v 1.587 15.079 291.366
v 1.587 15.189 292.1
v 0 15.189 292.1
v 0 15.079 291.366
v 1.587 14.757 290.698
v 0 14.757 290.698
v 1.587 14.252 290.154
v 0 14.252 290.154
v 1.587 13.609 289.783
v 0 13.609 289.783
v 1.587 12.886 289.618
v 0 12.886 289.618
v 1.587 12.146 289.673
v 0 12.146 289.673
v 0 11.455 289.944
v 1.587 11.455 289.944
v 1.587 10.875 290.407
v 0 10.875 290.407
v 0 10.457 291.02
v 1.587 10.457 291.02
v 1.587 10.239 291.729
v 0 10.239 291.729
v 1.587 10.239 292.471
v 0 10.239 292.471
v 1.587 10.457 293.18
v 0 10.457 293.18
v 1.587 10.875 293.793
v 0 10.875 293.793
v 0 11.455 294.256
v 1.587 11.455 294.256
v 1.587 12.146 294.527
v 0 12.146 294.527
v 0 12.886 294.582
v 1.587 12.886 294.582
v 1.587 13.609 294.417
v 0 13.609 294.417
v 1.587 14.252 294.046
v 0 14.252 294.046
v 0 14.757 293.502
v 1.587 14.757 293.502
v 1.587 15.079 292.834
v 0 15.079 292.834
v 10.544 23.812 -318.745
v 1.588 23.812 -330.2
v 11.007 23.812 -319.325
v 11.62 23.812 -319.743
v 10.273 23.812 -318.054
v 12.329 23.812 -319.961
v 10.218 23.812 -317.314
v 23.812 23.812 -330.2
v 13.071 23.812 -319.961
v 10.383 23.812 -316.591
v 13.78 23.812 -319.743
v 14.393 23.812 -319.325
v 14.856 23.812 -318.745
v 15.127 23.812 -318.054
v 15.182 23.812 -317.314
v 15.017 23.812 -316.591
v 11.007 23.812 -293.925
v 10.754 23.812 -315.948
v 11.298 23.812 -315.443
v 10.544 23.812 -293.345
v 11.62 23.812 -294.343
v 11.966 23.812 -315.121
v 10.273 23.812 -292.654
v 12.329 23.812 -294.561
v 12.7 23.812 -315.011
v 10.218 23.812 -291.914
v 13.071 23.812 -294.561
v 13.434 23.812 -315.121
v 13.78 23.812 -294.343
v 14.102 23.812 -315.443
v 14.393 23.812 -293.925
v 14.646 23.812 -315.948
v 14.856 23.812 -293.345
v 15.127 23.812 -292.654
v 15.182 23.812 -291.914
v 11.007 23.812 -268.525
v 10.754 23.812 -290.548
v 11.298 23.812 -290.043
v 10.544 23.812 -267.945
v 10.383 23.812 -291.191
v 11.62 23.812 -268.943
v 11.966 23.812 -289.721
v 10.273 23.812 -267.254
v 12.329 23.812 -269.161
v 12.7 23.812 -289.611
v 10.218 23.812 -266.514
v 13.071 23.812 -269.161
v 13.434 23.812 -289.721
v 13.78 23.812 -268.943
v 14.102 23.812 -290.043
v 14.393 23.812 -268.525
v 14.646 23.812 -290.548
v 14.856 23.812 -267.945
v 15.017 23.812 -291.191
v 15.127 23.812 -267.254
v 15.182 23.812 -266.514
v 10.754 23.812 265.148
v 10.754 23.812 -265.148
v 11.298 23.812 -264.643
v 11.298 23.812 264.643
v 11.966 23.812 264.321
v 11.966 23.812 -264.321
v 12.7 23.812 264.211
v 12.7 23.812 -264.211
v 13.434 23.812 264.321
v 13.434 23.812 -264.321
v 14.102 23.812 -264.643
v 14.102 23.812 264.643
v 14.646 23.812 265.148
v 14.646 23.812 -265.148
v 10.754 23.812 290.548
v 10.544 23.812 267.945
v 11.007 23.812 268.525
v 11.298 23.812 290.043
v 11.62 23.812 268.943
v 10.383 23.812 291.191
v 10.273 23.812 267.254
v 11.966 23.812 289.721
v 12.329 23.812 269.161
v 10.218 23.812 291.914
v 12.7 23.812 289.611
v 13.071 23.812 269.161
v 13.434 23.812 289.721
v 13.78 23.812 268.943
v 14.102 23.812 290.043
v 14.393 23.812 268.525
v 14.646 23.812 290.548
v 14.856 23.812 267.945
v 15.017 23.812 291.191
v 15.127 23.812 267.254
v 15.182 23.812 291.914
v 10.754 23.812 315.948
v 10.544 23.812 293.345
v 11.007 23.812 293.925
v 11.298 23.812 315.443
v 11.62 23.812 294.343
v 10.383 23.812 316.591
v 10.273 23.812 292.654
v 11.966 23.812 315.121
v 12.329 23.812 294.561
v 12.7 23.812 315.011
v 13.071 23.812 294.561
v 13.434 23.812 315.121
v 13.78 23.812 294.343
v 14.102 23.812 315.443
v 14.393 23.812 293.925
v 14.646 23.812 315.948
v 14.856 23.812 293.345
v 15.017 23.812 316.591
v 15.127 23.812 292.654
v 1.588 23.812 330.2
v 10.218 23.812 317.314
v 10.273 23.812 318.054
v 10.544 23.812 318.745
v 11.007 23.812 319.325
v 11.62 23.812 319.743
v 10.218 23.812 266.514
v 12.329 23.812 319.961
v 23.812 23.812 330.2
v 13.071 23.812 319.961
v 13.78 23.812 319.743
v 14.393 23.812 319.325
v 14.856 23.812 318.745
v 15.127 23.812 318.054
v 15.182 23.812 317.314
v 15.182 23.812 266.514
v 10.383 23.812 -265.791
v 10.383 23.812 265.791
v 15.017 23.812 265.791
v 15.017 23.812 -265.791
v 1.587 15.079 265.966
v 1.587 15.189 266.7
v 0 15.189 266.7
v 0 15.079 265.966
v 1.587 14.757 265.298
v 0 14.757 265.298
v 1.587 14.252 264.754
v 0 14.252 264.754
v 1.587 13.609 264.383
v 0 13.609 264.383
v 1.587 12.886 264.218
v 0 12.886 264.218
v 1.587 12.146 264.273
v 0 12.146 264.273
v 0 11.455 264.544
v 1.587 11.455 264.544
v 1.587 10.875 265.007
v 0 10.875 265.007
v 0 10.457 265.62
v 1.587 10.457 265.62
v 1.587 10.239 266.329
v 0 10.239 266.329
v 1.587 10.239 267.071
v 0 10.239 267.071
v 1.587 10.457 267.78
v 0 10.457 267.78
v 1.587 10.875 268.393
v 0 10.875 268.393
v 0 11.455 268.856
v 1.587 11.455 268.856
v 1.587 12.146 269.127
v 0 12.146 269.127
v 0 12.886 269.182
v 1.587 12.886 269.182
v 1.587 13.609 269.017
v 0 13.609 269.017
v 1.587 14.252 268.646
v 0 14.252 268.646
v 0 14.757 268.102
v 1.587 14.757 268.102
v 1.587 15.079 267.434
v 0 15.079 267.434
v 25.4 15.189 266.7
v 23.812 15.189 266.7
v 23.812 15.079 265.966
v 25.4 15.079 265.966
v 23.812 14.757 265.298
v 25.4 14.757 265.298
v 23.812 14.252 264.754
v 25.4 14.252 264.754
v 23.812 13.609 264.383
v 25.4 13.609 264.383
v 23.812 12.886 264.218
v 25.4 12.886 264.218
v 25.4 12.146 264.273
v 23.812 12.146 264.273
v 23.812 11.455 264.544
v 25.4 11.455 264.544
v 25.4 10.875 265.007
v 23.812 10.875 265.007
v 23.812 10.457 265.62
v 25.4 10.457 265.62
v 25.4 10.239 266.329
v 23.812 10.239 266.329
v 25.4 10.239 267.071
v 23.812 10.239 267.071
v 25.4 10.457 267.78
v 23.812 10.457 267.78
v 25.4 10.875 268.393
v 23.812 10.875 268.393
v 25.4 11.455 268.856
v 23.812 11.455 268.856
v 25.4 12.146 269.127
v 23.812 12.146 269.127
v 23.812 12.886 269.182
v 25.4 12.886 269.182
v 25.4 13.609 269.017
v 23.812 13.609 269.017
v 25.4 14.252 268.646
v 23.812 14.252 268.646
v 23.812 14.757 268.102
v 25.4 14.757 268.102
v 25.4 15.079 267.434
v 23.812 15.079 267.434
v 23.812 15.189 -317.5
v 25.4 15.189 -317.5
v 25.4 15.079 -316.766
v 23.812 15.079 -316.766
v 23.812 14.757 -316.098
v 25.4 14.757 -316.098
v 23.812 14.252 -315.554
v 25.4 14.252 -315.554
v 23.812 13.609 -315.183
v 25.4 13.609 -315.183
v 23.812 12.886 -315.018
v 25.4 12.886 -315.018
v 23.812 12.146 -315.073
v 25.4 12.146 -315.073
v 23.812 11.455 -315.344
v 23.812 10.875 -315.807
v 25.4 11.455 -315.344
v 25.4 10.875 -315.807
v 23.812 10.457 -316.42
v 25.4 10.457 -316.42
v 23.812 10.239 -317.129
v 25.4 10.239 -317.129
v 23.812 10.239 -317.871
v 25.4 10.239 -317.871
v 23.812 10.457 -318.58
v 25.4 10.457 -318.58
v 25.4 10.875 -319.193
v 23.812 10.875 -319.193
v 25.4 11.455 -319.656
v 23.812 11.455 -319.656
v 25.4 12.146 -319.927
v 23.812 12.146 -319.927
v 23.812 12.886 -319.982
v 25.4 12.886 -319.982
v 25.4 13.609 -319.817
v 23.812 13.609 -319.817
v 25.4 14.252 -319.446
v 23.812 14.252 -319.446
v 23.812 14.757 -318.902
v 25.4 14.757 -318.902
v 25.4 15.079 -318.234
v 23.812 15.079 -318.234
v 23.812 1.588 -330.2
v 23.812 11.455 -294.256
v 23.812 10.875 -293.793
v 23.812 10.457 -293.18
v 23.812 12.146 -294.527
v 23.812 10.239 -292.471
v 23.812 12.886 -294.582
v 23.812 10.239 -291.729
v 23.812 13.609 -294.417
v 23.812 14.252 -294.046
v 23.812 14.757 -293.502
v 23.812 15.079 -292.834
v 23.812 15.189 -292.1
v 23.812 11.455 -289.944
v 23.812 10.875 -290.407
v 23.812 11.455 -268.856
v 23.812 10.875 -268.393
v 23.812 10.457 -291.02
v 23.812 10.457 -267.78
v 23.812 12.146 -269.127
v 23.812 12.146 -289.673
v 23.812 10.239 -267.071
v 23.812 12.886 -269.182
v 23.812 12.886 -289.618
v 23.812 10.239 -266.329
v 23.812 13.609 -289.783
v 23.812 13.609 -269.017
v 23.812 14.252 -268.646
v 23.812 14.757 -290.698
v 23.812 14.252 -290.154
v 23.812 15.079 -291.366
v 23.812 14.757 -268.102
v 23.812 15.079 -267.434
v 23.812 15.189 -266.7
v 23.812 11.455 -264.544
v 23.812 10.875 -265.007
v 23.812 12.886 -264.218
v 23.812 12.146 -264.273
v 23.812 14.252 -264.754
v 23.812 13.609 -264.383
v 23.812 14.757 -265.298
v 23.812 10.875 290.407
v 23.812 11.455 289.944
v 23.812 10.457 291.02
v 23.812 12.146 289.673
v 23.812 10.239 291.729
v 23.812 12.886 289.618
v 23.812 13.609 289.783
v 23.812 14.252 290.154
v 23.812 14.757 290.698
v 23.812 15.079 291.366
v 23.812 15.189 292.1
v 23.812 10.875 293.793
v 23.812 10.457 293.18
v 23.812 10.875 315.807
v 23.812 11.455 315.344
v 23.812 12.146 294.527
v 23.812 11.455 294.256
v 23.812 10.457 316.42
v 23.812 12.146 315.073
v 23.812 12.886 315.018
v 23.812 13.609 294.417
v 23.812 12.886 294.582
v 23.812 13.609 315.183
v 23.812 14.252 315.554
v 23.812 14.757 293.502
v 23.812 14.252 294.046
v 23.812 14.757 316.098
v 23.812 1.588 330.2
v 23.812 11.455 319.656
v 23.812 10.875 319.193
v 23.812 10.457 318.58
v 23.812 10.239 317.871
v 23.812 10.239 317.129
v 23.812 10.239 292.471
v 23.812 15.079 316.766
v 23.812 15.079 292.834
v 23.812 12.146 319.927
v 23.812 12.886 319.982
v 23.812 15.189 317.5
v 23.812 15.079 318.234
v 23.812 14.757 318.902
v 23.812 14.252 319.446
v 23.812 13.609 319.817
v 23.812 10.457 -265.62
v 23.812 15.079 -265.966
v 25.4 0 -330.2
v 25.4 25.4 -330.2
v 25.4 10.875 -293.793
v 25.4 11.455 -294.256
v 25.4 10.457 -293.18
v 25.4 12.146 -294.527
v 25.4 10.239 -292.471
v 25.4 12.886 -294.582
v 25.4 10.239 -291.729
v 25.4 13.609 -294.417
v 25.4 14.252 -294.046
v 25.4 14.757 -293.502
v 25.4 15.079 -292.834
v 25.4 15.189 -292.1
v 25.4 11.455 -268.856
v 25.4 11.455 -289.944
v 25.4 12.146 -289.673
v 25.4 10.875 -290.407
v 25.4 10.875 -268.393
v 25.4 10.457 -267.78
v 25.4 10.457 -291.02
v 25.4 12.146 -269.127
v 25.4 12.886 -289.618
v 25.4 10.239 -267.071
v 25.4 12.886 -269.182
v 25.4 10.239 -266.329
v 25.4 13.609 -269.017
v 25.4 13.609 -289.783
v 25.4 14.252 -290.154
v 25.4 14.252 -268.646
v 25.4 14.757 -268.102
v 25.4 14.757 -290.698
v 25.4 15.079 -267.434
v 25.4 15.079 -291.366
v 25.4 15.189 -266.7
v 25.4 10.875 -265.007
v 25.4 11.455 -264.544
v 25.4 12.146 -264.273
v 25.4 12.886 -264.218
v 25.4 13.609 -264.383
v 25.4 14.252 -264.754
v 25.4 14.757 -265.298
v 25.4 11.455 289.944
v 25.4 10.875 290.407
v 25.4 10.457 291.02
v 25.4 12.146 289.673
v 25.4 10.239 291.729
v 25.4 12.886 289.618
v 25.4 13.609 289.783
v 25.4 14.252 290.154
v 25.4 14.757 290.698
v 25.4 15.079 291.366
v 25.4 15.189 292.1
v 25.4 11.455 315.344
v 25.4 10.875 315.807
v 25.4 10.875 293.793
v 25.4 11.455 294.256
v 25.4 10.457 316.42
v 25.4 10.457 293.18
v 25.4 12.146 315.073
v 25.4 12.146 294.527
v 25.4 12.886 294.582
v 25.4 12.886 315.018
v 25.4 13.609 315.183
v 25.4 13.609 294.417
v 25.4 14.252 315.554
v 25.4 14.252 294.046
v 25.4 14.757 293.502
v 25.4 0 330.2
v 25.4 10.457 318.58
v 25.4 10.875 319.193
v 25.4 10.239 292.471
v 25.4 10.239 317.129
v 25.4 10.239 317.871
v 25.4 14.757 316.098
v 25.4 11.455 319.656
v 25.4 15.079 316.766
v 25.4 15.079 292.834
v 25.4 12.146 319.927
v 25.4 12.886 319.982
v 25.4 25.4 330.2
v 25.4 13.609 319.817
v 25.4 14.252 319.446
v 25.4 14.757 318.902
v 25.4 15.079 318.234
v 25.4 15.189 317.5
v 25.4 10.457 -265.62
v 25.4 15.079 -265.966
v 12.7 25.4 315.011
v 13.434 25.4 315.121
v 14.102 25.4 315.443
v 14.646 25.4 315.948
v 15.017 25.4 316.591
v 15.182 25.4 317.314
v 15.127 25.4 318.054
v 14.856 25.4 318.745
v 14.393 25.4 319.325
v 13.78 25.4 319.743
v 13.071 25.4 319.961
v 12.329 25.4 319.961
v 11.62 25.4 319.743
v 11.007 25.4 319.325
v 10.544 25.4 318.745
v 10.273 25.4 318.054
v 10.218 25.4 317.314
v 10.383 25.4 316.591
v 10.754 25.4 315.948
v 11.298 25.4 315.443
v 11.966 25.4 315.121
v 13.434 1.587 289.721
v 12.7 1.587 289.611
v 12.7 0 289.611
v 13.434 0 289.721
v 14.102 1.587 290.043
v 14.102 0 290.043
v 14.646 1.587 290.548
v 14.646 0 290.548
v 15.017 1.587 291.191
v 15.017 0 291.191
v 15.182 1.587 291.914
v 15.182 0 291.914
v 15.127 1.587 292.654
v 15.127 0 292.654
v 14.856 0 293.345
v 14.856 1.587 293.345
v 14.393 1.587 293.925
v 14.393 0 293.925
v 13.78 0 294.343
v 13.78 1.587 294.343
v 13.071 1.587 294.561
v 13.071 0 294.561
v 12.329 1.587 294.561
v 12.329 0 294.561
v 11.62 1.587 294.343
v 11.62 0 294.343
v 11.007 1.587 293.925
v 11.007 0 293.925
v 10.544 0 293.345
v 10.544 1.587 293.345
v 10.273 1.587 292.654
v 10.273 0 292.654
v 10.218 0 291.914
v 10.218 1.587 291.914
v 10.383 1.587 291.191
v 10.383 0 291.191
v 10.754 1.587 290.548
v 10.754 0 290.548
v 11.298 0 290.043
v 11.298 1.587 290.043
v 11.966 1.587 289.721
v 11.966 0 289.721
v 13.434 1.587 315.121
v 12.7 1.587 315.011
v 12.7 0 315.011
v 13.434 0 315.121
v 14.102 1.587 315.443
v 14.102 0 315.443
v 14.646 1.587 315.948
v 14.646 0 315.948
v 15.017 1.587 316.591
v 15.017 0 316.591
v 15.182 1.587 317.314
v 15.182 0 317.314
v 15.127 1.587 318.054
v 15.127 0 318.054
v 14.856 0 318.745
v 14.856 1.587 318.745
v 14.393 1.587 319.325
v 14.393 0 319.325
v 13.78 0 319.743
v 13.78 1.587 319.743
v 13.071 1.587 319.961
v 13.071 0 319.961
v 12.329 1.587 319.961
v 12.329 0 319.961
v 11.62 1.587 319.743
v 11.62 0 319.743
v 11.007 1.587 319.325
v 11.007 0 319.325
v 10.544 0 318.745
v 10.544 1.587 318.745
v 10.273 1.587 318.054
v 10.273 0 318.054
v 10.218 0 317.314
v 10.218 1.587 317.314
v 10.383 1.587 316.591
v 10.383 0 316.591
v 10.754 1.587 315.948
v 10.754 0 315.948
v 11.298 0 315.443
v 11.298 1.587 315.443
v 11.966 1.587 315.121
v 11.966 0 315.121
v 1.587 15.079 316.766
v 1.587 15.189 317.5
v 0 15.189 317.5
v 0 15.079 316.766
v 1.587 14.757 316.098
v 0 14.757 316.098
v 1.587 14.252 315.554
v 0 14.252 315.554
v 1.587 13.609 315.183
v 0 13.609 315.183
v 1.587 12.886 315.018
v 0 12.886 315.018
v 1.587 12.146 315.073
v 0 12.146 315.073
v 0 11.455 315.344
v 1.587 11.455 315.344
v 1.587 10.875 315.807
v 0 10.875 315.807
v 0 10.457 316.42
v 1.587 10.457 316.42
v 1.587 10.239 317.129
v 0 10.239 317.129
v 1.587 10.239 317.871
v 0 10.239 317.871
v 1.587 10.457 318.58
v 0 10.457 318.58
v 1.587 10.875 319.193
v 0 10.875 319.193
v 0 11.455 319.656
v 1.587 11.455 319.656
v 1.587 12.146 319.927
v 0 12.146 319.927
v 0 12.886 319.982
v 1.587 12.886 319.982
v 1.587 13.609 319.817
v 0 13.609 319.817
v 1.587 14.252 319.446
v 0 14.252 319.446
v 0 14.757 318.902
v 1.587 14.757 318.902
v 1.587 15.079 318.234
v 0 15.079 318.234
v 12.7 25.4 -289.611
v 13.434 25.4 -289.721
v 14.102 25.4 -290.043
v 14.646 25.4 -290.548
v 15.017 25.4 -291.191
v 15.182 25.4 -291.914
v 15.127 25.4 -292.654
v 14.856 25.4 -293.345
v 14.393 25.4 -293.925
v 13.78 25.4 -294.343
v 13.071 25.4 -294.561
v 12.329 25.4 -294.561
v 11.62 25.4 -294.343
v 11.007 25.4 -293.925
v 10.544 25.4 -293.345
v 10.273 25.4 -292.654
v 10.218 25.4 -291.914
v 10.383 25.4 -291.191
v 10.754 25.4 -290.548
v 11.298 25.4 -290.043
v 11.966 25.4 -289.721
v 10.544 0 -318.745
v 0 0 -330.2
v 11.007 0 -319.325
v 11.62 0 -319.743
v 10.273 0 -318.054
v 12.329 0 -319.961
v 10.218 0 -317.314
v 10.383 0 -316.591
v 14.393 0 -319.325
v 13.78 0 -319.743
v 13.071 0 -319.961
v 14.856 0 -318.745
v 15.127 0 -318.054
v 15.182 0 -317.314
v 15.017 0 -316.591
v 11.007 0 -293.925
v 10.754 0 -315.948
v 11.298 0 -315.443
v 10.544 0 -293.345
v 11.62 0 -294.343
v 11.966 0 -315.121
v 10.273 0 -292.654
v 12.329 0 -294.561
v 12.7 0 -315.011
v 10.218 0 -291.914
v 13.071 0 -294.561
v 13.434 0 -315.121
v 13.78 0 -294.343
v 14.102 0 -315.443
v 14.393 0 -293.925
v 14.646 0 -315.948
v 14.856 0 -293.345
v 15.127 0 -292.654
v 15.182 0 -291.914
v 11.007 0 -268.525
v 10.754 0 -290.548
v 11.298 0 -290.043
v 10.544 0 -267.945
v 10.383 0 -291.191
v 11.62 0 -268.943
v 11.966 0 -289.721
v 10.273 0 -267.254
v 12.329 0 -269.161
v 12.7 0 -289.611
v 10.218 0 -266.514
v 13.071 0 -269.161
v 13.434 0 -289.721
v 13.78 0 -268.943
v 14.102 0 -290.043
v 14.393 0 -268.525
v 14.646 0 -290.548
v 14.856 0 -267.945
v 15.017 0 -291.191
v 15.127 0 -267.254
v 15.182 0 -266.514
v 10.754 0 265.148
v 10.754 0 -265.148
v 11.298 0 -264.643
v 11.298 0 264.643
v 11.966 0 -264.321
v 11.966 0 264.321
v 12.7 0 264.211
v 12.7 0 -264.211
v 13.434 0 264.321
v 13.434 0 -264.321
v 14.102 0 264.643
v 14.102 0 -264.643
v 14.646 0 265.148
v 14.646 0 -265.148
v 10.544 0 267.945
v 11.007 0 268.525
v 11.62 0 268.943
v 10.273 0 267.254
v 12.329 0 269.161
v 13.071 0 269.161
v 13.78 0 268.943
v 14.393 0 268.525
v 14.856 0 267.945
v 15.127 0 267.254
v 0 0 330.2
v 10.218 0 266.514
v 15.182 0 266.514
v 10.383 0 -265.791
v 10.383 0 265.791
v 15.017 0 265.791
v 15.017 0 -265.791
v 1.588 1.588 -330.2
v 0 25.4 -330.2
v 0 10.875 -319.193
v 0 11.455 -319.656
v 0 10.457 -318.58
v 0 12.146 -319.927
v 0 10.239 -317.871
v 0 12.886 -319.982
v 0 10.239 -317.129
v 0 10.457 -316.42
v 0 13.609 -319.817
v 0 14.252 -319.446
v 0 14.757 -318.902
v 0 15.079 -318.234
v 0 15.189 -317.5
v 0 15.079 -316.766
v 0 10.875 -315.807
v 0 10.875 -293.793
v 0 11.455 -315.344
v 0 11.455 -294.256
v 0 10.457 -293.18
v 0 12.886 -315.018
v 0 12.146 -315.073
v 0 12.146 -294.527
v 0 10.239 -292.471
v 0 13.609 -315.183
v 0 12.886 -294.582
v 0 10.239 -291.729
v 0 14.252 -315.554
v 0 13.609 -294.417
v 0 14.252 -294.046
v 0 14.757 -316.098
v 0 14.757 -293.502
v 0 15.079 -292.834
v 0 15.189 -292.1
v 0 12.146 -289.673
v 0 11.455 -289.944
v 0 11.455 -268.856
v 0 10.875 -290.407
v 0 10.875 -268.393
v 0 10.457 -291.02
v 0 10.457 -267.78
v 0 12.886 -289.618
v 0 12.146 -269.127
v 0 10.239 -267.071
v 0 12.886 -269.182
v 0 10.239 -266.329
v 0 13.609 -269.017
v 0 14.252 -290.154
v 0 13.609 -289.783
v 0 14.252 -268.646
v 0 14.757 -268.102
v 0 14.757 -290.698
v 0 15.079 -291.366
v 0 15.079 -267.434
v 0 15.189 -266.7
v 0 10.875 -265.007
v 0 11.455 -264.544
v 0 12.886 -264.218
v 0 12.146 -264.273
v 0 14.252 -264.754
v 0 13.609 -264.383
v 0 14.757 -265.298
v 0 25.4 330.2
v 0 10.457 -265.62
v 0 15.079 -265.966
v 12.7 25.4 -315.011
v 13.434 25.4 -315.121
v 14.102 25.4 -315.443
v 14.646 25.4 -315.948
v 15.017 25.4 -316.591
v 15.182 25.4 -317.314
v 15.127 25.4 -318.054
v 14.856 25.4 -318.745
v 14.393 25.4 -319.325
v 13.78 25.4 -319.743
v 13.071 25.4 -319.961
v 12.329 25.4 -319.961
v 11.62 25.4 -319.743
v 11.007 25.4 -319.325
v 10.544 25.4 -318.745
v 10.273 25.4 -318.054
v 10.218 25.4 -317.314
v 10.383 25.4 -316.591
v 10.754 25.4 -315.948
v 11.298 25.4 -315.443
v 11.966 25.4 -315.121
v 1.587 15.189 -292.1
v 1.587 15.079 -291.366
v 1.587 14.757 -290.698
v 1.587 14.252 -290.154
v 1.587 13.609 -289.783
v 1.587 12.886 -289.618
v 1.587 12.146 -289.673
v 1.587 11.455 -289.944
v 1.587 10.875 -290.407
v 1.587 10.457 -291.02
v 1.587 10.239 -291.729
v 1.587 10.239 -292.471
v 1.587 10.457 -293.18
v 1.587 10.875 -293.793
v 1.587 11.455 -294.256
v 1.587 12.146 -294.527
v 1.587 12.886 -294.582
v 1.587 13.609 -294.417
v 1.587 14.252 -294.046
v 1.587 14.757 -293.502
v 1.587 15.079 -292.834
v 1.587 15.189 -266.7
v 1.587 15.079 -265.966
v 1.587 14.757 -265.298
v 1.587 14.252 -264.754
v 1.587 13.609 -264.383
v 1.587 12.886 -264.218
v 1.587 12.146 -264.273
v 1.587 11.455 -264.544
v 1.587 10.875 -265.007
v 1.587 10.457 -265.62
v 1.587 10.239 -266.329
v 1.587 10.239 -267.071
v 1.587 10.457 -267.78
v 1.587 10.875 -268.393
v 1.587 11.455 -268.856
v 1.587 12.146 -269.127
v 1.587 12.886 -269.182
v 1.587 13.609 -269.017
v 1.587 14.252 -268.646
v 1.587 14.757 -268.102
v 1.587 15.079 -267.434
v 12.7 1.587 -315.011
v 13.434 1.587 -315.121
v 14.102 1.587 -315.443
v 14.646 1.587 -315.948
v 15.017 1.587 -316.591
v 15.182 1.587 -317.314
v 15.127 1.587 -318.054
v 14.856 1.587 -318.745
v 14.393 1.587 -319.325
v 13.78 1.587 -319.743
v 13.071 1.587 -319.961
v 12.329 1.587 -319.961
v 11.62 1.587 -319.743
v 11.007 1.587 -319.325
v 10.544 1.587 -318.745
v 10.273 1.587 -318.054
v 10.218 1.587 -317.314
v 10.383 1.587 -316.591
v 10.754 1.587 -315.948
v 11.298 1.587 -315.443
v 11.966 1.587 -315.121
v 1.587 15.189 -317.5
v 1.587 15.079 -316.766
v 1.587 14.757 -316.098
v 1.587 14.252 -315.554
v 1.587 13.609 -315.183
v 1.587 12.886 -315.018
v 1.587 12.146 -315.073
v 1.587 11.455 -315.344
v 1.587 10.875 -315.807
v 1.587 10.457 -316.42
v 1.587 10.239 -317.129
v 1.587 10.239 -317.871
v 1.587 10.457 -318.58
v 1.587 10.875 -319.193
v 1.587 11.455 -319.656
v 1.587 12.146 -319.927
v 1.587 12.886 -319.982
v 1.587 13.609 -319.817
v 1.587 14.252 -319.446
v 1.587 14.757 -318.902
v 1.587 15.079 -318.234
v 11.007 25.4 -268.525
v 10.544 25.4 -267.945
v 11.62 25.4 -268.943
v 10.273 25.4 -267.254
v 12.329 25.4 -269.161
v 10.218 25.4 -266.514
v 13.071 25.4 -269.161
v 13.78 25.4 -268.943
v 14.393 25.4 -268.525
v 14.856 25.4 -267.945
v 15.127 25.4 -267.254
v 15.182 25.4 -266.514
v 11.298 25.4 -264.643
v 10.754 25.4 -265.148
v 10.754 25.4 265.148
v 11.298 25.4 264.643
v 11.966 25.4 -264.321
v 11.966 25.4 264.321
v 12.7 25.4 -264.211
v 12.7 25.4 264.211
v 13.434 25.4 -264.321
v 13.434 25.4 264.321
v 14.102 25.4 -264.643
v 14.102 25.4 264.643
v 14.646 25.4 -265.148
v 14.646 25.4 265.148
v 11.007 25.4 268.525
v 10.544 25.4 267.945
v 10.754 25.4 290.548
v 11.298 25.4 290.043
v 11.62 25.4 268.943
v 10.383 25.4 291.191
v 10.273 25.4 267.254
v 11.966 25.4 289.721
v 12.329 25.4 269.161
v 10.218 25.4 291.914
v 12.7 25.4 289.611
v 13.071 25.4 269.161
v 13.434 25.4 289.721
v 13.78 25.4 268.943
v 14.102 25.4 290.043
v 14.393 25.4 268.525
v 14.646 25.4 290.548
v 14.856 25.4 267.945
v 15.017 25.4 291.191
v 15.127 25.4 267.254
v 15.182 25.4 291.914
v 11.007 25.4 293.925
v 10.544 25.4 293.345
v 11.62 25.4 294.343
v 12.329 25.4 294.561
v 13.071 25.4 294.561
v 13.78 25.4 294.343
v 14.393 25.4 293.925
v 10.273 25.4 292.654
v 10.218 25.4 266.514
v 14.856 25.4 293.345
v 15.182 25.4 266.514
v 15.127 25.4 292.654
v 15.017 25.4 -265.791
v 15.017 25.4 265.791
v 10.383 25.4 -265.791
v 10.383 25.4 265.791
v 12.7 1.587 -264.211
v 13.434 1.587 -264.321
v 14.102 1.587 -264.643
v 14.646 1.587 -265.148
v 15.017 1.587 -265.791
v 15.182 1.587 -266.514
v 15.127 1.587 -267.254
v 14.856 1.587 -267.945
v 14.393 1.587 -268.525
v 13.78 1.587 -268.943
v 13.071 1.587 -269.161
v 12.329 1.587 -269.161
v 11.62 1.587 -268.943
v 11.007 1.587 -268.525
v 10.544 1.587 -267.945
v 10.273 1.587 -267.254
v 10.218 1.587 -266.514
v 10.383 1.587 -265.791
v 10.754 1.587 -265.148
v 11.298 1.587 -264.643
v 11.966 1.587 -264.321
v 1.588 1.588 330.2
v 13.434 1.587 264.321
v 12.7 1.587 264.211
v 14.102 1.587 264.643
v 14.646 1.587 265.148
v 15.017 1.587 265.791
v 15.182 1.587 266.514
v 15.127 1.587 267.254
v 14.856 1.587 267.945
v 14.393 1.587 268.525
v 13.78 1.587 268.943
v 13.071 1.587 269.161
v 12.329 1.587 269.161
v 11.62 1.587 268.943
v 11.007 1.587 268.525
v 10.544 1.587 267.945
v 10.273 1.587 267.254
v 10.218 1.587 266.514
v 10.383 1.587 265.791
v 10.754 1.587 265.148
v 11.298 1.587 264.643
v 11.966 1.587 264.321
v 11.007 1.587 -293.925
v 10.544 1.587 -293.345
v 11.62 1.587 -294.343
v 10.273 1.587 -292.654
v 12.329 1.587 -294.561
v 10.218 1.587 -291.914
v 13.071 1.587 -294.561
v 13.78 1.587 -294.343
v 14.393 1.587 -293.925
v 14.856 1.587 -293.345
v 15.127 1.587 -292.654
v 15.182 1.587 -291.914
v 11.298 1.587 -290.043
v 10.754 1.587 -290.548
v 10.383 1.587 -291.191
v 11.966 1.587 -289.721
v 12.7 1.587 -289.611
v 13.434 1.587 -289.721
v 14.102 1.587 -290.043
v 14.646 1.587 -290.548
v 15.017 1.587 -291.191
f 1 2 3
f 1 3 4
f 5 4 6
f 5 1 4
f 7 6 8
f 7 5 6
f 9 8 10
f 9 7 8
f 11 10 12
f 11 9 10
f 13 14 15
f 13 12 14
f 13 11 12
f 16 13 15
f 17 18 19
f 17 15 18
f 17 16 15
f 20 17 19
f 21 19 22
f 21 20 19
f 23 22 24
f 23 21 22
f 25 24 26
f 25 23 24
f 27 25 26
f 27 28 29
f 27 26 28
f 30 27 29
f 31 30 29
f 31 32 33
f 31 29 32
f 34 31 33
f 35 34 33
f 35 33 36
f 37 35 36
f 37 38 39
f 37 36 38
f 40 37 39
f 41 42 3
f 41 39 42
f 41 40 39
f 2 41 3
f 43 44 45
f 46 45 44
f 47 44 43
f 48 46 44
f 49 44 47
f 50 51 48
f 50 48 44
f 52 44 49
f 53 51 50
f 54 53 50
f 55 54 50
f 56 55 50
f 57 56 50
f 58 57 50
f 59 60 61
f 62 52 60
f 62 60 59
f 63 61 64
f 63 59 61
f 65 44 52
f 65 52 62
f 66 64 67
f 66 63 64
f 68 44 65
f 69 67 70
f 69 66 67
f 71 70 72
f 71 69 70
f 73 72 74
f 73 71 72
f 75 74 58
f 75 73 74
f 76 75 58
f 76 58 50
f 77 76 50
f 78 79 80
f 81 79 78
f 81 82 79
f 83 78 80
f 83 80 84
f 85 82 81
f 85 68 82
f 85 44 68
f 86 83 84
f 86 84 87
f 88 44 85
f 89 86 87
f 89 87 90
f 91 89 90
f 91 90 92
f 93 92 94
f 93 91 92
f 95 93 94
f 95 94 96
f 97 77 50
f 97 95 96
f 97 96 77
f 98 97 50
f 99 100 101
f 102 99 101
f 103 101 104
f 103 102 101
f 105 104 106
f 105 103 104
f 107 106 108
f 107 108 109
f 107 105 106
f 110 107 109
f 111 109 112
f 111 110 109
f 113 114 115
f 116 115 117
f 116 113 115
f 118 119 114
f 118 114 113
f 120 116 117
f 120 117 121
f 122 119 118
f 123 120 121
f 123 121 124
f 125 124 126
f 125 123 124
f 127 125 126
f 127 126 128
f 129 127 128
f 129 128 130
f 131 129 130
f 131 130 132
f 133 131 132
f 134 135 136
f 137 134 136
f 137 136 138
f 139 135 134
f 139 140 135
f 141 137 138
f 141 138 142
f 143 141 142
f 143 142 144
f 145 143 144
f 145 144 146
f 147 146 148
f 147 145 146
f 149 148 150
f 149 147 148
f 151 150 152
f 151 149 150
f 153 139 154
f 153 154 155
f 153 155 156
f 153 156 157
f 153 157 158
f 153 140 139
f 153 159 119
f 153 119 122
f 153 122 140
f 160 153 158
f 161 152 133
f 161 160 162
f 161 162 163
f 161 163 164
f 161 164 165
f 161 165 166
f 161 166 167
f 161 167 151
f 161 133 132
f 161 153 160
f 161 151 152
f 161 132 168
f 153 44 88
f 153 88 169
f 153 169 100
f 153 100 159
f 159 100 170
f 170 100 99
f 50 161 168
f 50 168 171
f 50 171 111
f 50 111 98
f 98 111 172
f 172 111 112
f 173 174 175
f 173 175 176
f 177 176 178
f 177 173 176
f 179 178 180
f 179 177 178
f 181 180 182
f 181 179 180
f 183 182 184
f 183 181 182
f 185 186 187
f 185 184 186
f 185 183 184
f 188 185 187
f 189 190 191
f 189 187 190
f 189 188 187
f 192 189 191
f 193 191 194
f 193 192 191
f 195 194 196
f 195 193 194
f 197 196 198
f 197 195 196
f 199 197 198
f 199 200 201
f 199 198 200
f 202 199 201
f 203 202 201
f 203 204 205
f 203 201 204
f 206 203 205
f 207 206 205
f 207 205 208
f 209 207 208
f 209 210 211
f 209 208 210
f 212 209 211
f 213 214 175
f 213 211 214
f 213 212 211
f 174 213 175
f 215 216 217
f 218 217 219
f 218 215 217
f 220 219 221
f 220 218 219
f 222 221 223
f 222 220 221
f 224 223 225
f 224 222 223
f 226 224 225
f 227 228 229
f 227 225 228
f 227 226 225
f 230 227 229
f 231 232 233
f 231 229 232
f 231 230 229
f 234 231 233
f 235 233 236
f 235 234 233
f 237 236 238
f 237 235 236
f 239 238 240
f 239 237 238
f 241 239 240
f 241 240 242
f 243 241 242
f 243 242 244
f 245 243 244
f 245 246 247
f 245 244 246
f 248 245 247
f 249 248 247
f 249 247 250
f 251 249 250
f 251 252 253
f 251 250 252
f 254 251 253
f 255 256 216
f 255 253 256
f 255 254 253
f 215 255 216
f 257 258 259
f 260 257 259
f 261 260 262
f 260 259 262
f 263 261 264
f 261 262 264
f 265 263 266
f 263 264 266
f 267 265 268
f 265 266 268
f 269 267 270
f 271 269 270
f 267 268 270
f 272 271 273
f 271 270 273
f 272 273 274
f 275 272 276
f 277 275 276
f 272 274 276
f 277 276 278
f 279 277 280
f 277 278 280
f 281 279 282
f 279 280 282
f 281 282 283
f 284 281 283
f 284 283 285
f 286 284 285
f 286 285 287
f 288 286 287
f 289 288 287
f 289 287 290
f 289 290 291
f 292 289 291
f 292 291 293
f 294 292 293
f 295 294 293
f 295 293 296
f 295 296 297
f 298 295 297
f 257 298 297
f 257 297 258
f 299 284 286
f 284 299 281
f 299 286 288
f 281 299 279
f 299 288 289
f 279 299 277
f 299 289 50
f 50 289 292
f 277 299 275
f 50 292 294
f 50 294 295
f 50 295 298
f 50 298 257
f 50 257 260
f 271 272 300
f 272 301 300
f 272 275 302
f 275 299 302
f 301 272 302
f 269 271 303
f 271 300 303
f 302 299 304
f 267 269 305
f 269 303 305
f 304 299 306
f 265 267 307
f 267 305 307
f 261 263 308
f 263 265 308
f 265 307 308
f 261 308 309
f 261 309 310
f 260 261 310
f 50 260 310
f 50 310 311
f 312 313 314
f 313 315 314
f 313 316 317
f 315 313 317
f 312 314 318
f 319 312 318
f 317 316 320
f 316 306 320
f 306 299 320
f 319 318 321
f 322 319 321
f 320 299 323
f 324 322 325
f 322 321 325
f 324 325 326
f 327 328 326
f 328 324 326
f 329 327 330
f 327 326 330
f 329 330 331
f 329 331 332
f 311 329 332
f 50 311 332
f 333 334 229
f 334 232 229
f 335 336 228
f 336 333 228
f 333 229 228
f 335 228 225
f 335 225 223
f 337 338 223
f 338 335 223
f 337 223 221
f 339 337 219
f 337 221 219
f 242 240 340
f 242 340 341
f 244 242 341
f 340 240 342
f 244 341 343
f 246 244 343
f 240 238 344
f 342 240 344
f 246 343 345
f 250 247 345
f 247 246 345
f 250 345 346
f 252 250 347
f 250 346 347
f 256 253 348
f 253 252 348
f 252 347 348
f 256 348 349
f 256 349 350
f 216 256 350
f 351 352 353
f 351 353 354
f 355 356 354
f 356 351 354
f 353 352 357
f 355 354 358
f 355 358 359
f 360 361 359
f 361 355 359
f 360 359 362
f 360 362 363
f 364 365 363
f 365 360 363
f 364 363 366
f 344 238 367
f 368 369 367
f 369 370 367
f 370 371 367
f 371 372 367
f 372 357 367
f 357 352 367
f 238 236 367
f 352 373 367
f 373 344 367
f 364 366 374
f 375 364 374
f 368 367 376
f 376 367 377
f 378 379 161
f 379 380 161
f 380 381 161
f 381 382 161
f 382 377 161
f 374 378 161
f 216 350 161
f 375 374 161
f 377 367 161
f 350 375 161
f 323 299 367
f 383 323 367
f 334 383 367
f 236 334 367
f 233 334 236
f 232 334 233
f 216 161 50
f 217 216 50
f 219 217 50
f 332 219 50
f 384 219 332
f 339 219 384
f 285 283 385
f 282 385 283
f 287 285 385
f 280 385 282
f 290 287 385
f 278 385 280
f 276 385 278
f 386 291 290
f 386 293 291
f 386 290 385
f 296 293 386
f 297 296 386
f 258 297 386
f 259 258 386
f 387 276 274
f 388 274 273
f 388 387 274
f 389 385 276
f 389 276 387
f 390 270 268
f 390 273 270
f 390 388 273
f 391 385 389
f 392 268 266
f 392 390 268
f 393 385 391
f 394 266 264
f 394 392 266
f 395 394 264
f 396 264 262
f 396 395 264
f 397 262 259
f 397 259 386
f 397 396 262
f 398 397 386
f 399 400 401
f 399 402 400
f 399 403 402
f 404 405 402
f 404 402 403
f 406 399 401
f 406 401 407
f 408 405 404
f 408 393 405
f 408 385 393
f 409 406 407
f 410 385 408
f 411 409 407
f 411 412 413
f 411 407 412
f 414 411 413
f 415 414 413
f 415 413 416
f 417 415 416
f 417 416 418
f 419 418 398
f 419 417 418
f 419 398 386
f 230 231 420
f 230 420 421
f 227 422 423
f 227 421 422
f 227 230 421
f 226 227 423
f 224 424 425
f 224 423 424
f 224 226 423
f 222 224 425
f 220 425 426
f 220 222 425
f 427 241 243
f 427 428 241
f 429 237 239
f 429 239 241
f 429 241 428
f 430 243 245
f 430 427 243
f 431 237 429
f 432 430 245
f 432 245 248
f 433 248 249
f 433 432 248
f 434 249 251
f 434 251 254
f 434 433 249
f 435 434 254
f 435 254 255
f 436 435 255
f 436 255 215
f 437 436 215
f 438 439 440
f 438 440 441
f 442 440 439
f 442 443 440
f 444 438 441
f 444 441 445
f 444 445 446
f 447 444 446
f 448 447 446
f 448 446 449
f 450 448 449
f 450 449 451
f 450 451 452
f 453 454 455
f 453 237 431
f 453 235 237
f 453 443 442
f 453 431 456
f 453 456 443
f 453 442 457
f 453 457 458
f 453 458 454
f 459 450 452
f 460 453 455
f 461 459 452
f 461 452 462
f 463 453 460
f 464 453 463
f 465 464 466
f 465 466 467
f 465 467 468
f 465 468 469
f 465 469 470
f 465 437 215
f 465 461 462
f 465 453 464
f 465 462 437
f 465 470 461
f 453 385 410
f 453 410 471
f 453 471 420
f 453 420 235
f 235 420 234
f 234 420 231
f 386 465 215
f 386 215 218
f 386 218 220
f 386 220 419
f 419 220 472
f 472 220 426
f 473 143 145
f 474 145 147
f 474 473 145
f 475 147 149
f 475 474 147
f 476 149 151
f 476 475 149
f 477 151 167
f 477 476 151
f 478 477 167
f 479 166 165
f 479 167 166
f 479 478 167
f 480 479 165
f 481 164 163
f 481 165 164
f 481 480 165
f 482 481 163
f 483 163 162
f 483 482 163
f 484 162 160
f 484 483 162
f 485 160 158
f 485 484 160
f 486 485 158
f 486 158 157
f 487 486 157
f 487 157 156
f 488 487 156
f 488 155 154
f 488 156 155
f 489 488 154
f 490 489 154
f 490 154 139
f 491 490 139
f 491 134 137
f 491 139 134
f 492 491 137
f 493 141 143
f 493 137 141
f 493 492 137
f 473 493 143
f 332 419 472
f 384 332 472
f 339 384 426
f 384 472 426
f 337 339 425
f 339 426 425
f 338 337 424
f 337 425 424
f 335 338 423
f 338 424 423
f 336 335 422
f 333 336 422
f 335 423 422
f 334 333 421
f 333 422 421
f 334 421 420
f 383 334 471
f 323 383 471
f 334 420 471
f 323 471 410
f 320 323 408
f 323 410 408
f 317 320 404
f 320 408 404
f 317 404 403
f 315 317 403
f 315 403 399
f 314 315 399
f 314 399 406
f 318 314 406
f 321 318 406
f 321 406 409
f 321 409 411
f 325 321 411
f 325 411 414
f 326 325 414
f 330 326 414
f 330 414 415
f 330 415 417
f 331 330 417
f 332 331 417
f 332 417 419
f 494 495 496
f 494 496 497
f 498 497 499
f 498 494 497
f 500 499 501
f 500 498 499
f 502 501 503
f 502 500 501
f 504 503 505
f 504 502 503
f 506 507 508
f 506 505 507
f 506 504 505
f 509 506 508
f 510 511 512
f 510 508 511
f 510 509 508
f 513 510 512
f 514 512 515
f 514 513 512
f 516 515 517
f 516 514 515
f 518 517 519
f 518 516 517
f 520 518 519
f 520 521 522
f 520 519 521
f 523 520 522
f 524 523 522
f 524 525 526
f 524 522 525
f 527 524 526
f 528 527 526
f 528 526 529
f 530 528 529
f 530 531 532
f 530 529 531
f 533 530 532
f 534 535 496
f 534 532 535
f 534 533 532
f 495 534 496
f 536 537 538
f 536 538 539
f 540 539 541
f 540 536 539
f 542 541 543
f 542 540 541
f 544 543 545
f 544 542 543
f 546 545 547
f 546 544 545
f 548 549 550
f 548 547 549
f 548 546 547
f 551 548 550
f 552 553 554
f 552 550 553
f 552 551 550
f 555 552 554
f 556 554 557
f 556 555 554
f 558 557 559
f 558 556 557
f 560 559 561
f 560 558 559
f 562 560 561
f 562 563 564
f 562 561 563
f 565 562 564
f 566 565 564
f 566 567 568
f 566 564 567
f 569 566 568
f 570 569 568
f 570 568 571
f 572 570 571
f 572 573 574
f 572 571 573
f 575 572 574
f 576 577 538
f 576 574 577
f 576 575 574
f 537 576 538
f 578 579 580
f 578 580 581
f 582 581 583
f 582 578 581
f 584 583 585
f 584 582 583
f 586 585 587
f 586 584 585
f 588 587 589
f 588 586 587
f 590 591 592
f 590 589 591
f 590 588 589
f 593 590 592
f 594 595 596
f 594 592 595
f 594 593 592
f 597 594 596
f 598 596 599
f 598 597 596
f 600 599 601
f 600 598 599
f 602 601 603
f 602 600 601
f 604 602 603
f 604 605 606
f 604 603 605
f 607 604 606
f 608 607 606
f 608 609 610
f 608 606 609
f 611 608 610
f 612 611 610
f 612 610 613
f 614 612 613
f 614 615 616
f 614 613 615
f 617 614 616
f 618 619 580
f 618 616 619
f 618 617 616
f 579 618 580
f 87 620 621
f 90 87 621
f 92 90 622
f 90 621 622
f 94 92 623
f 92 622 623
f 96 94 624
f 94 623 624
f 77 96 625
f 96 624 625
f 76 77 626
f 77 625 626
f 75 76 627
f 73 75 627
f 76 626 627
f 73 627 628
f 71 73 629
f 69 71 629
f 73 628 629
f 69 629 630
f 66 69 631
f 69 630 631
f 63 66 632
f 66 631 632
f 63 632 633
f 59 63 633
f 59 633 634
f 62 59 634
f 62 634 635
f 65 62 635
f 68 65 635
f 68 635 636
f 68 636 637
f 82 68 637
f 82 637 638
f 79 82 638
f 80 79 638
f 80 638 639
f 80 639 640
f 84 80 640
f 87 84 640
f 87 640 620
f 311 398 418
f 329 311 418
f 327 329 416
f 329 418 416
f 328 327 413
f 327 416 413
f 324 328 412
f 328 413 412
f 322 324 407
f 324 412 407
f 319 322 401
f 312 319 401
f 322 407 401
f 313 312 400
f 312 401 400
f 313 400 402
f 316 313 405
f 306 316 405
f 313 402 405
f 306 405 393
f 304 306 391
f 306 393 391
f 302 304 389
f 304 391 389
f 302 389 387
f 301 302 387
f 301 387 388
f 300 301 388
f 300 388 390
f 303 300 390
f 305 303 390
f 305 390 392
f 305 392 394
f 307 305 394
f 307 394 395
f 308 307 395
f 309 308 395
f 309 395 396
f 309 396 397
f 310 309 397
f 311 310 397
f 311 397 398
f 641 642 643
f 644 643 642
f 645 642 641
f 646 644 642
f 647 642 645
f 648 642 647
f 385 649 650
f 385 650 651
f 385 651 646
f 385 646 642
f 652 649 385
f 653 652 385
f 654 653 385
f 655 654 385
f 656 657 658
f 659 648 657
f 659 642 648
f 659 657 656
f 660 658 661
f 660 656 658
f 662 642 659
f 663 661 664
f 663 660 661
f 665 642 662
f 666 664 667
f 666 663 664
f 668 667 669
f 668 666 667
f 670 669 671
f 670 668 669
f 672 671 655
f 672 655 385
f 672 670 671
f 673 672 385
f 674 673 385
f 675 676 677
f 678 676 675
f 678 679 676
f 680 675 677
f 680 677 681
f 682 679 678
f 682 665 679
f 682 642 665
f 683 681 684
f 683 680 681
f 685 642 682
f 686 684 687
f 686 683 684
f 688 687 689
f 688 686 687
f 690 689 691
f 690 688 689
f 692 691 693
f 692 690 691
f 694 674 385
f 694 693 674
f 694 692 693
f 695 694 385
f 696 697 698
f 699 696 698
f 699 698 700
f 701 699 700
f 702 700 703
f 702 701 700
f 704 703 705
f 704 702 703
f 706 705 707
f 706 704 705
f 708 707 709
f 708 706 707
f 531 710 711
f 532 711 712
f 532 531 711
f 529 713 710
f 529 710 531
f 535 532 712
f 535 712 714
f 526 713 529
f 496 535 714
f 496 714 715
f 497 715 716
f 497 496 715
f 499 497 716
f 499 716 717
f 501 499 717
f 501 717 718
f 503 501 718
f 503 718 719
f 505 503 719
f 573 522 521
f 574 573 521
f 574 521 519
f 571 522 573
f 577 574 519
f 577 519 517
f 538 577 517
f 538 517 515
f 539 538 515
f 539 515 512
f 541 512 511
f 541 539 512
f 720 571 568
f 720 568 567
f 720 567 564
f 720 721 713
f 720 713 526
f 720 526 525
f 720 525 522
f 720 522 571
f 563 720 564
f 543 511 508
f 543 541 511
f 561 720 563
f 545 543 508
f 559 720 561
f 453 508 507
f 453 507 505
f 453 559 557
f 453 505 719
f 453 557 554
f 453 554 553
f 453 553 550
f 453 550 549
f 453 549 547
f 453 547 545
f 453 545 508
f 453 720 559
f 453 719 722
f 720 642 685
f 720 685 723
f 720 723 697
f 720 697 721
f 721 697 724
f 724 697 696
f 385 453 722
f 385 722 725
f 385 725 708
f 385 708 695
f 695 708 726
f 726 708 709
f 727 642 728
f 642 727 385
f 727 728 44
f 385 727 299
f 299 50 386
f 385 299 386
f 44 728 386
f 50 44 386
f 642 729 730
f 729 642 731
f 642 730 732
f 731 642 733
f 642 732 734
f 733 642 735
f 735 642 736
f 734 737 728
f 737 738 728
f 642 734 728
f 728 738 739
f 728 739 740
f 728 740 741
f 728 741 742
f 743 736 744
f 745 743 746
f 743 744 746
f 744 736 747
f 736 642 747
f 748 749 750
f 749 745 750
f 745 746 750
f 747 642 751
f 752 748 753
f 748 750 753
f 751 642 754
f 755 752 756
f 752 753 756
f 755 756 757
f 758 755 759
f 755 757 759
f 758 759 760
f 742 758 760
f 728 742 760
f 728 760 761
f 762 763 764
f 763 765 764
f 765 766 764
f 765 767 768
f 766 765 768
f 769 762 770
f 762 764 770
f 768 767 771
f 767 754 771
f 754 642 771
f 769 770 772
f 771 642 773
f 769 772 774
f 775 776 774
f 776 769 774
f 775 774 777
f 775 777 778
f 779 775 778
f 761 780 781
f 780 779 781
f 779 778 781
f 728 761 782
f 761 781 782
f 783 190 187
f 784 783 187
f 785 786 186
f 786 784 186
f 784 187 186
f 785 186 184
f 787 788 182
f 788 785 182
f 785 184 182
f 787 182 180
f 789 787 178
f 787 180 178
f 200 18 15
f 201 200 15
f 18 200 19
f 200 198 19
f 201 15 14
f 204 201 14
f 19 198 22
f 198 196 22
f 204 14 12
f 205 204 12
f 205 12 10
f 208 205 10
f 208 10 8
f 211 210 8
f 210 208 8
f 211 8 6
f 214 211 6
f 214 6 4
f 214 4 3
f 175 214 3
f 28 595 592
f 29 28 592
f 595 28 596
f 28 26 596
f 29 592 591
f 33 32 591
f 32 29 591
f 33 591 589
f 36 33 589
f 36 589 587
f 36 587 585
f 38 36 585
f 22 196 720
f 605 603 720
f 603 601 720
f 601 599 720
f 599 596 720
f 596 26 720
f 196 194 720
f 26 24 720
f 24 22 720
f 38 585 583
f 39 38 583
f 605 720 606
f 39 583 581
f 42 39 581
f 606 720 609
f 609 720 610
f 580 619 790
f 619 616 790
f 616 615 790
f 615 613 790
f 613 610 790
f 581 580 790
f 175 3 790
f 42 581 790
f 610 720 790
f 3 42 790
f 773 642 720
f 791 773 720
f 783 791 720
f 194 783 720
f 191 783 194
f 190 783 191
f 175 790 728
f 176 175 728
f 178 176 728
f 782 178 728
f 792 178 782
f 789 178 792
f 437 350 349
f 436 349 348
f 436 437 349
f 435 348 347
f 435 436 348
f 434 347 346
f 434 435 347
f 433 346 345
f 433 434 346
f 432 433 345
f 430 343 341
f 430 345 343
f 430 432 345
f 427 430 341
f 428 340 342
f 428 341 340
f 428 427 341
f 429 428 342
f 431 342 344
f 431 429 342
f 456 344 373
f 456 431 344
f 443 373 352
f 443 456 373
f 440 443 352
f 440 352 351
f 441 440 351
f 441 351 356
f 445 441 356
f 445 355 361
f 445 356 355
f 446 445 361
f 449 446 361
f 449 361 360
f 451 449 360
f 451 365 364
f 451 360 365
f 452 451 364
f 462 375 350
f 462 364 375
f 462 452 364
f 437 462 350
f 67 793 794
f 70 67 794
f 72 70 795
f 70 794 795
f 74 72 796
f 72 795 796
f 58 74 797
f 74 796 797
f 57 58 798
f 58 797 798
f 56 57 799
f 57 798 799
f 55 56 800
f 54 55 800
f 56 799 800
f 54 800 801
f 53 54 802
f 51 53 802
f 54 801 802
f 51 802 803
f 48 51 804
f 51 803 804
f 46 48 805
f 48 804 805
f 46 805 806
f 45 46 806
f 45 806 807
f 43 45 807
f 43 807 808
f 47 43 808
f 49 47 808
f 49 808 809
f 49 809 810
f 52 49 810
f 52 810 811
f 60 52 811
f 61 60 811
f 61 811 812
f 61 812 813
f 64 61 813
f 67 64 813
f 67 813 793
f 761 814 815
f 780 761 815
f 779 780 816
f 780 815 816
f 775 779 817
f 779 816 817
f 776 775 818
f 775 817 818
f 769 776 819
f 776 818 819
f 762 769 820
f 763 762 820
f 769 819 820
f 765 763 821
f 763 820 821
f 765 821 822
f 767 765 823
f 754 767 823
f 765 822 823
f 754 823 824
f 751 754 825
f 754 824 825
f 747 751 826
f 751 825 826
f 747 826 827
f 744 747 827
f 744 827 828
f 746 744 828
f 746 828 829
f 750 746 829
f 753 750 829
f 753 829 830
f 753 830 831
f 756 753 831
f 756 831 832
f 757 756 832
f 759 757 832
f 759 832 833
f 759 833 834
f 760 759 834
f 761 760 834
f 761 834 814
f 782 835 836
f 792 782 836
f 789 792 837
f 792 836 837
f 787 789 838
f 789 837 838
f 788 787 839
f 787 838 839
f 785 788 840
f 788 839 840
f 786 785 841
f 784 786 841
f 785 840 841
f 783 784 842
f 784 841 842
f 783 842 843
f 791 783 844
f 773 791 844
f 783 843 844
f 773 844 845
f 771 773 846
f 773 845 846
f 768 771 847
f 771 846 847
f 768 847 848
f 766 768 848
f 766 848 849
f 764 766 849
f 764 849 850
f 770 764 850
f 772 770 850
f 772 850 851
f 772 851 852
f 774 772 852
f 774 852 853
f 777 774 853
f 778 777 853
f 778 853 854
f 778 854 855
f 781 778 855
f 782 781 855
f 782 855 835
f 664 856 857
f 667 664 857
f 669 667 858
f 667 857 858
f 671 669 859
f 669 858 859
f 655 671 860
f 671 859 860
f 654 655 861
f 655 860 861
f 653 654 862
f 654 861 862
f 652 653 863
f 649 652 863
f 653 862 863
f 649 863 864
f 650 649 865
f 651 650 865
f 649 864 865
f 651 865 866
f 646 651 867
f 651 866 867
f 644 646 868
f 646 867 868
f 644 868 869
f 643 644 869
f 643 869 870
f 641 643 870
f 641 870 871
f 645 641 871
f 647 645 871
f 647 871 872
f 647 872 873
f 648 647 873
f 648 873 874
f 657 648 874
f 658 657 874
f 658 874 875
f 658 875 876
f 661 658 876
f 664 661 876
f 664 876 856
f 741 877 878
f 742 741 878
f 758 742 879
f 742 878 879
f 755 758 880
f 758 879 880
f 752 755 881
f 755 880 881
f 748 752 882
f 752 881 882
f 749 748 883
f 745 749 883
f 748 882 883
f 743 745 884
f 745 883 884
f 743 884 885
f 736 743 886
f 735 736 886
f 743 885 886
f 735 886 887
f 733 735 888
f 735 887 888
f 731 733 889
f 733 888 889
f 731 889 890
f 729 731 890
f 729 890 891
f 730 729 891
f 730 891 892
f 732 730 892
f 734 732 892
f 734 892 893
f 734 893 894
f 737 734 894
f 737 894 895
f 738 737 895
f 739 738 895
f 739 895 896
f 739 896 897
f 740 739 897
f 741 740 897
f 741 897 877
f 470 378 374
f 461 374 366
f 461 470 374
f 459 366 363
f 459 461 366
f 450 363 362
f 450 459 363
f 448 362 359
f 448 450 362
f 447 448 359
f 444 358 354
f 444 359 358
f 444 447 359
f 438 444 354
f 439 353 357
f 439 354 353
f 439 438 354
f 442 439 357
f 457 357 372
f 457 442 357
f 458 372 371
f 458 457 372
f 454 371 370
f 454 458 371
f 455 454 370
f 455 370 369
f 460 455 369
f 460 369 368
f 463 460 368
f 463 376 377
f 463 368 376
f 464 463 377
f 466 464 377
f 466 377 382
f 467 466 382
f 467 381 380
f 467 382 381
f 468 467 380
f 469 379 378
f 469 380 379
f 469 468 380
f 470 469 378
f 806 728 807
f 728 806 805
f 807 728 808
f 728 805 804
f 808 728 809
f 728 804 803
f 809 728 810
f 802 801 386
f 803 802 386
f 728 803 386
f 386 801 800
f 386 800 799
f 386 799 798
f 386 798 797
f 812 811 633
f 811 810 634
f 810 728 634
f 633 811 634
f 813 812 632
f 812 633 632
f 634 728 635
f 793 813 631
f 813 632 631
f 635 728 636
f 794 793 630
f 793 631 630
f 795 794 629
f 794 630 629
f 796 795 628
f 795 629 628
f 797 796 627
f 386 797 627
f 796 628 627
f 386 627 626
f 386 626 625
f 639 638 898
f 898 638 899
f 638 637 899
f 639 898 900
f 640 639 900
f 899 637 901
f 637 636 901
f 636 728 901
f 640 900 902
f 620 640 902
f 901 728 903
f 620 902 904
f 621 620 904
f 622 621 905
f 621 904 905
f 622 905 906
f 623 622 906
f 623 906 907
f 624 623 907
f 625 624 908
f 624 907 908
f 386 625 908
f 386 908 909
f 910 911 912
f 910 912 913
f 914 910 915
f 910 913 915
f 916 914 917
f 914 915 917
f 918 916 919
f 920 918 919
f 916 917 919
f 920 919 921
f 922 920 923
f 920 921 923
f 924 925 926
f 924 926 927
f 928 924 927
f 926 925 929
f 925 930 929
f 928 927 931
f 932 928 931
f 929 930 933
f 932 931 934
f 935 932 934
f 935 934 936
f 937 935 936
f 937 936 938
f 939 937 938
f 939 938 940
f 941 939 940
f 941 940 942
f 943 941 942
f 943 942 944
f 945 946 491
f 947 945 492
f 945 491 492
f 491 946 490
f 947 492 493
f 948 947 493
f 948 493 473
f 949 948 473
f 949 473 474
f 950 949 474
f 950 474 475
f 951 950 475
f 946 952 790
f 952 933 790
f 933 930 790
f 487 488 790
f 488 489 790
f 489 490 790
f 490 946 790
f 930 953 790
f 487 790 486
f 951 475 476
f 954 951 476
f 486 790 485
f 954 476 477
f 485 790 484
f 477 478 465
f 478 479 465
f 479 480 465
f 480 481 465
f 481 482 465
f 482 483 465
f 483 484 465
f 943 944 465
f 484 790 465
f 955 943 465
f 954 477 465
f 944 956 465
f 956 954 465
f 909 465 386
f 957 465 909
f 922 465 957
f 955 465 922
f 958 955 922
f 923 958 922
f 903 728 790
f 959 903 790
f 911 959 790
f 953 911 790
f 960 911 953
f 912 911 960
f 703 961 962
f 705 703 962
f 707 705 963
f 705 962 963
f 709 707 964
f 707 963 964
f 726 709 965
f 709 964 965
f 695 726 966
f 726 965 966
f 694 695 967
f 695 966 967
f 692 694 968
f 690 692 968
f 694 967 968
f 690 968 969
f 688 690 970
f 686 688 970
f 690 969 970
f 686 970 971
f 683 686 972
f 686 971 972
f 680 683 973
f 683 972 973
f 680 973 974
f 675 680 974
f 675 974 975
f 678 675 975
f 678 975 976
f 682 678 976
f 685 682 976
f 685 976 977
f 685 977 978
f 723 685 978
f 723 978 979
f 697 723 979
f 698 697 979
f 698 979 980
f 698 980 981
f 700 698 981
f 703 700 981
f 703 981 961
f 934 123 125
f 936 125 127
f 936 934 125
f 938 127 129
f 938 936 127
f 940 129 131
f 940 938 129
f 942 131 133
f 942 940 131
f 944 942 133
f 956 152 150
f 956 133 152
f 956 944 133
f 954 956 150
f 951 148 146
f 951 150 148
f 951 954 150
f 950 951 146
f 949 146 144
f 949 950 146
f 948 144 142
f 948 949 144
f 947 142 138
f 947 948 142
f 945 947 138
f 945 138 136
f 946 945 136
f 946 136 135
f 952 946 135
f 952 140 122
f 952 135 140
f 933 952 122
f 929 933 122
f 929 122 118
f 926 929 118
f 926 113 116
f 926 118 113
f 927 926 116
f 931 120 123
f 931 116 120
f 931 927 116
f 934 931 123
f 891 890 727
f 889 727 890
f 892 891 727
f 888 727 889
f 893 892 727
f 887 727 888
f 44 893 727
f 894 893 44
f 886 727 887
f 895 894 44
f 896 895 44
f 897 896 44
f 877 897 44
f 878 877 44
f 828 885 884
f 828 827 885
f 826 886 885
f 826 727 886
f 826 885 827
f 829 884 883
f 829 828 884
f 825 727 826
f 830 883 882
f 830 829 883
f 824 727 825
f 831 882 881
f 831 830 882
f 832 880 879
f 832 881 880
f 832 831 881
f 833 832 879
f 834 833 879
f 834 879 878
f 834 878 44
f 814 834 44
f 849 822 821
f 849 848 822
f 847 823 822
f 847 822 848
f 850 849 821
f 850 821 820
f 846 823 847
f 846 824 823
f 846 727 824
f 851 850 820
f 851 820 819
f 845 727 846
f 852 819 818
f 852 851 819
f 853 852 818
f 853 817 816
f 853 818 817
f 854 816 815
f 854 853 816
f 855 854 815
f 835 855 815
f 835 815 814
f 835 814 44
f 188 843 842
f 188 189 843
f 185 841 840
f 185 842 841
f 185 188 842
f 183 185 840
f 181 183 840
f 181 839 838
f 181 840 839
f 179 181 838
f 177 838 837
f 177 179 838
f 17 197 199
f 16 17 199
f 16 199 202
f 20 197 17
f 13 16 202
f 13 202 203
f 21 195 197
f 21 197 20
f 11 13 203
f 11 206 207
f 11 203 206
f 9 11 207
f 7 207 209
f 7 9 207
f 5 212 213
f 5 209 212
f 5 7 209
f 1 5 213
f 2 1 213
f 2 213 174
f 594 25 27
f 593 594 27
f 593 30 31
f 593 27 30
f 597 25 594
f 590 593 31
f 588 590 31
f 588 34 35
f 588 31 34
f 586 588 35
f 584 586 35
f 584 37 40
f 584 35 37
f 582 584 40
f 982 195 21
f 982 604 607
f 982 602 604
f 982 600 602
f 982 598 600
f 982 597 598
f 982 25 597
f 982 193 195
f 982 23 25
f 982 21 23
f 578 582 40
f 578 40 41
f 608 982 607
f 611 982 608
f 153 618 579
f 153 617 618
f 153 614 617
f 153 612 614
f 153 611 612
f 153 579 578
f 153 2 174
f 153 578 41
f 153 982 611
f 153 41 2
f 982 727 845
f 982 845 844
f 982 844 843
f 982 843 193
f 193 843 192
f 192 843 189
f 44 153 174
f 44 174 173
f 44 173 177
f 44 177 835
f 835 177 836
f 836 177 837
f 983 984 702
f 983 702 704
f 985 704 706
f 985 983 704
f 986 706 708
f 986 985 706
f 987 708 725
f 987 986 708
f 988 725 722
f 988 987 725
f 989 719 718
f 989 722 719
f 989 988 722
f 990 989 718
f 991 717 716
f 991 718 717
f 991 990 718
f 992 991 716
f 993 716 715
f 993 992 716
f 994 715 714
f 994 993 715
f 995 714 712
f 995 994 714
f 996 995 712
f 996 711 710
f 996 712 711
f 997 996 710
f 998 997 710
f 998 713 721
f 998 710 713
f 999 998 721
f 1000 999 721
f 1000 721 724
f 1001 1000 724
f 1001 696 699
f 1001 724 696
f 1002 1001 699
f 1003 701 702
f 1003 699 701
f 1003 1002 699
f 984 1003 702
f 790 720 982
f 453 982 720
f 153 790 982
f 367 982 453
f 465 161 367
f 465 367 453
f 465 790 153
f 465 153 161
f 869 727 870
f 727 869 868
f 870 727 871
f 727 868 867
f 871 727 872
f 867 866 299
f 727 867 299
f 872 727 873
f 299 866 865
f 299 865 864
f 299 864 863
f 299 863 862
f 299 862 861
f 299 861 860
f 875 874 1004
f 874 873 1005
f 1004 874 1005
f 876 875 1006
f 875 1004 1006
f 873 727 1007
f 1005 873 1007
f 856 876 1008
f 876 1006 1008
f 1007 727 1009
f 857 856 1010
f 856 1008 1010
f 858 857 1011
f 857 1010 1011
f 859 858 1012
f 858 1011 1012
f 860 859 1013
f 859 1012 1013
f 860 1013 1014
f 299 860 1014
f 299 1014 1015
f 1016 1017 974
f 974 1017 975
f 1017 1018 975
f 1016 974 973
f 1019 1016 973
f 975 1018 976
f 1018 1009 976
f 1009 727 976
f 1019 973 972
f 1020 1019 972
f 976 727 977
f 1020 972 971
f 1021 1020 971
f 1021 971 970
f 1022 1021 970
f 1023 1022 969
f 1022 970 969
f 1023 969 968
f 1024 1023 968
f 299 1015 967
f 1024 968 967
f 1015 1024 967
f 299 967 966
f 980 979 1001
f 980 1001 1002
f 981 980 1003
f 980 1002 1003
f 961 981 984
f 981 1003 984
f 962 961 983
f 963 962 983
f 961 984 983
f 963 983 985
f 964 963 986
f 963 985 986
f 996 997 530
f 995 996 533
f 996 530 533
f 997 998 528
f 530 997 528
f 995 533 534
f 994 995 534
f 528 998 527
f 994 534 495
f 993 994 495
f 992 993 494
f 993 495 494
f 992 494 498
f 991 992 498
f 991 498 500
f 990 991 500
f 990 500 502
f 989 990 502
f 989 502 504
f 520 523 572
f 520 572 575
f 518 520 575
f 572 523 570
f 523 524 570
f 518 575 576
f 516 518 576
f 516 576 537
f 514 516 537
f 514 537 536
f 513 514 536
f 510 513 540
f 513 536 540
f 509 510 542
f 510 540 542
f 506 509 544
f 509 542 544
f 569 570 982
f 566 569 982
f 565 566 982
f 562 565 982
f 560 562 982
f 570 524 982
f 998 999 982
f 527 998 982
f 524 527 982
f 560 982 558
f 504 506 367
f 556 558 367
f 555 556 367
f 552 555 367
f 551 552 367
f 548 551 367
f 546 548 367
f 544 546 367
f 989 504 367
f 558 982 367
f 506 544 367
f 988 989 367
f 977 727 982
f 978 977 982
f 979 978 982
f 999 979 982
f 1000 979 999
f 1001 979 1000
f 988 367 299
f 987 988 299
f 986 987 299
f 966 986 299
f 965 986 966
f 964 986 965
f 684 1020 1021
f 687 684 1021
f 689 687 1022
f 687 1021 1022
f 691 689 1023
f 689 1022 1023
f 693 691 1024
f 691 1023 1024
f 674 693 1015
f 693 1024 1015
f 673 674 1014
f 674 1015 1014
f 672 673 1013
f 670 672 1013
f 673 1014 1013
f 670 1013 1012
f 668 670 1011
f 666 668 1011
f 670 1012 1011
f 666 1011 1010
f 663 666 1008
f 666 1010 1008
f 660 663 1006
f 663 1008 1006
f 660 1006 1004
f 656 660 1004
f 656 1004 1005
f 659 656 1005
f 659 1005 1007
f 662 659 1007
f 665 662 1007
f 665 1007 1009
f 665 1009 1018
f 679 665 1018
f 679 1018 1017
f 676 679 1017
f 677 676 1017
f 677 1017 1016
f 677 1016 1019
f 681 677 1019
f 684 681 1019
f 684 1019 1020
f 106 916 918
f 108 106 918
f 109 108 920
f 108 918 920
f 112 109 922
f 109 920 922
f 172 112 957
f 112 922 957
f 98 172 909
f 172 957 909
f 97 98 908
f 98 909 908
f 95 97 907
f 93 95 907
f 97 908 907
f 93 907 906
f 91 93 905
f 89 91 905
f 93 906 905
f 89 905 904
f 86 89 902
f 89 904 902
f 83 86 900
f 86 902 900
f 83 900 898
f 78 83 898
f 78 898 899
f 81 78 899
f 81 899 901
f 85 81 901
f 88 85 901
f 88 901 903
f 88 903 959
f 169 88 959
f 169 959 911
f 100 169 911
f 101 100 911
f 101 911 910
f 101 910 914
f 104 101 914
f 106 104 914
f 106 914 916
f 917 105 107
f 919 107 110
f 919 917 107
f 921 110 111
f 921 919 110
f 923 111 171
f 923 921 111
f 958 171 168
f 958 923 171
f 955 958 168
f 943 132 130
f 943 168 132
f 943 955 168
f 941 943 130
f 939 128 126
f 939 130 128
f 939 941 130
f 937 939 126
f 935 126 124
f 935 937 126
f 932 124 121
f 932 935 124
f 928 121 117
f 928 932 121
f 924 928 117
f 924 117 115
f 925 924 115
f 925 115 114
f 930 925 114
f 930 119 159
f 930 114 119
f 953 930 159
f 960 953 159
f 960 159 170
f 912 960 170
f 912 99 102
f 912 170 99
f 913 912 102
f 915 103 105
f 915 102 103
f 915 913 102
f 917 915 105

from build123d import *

# Parameters (mm, degrees)
SKETCH5_W           = 25.4
SKETCH5_H           = 25.4
BOSS_EXTRUDE2_DEPTH = 330.2
SHELL3_T            = -1.5875
SKETCH6_R           = 2.4892
CUT_EXTRUDE2_DEPTH  = 333.148099498
SKETCH7_R           = 2.4892
CUT_EXTRUDE3_DEPTH  = 333.148099498


with BuildPart() as part:
    # Sketch5 → Boss-Extrude2 (new, symmetric)
    with BuildSketch(Plane.XY):
        with Locations((12.7, 12.7)):
            Rectangle(SKETCH5_W, SKETCH5_H)
    extrude(amount=BOSS_EXTRUDE2_DEPTH, both=True)

    # Shell3
    shell3_openings = [part.faces().sort_by_distance(p)[0] for p in [
        (12.7, 12.7, 330.2),
        (12.7, 12.7, -330.2),
    ]]
    offset(amount=SHELL3_T, openings=shell3_openings, kind=Kind.INTERSECTION)

    # Sketch6 → Cut-Extrude2 (cut, through all)
    with BuildSketch(Plane(origin=(0, 25.4, 0), x_dir=(1, 0, 0), z_dir=(0, 1, 0))):
        with Locations(Location((12.7, 317.5, 0), (0, 0, 270))):
            Circle(SKETCH6_R)
        with Locations(Location((12.7, 292.1, 0), (0, 0, 270))):
            Circle(SKETCH6_R)
        with Locations(Location((12.7, 266.7, 0), (0, 0, 270))):
            Circle(SKETCH6_R)
    cut_extrude2 = extrude(amount=-CUT_EXTRUDE2_DEPTH, mode=Mode.SUBTRACT)

    # Sketch7 → Cut-Extrude3 (cut, through all)
    with BuildSketch(Plane(origin=(25.4, 0, 0), x_dir=(0, 0, -1), z_dir=(1, 0, 0))):
        with Locations(Location((292.1, 12.7, 0), (0, 0, 90))):
            Circle(SKETCH7_R)
        with Locations(Location((317.5, 12.7, 0), (0, 0, 90))):
            Circle(SKETCH7_R)
        with Locations(Location((266.7, 12.7, 0), (0, 0, 90))):
            Circle(SKETCH7_R)
    cut_extrude3 = extrude(amount=-CUT_EXTRUDE3_DEPTH, mode=Mode.SUBTRACT)

    # Mirror2: Cut-Extrude2, Cut-Extrude3 across plane
    add(cut_extrude2.mirror(Plane.XY), mode=Mode.SUBTRACT)
    add(cut_extrude3.mirror(Plane.XY), mode=Mode.SUBTRACT)


solid = part.part
